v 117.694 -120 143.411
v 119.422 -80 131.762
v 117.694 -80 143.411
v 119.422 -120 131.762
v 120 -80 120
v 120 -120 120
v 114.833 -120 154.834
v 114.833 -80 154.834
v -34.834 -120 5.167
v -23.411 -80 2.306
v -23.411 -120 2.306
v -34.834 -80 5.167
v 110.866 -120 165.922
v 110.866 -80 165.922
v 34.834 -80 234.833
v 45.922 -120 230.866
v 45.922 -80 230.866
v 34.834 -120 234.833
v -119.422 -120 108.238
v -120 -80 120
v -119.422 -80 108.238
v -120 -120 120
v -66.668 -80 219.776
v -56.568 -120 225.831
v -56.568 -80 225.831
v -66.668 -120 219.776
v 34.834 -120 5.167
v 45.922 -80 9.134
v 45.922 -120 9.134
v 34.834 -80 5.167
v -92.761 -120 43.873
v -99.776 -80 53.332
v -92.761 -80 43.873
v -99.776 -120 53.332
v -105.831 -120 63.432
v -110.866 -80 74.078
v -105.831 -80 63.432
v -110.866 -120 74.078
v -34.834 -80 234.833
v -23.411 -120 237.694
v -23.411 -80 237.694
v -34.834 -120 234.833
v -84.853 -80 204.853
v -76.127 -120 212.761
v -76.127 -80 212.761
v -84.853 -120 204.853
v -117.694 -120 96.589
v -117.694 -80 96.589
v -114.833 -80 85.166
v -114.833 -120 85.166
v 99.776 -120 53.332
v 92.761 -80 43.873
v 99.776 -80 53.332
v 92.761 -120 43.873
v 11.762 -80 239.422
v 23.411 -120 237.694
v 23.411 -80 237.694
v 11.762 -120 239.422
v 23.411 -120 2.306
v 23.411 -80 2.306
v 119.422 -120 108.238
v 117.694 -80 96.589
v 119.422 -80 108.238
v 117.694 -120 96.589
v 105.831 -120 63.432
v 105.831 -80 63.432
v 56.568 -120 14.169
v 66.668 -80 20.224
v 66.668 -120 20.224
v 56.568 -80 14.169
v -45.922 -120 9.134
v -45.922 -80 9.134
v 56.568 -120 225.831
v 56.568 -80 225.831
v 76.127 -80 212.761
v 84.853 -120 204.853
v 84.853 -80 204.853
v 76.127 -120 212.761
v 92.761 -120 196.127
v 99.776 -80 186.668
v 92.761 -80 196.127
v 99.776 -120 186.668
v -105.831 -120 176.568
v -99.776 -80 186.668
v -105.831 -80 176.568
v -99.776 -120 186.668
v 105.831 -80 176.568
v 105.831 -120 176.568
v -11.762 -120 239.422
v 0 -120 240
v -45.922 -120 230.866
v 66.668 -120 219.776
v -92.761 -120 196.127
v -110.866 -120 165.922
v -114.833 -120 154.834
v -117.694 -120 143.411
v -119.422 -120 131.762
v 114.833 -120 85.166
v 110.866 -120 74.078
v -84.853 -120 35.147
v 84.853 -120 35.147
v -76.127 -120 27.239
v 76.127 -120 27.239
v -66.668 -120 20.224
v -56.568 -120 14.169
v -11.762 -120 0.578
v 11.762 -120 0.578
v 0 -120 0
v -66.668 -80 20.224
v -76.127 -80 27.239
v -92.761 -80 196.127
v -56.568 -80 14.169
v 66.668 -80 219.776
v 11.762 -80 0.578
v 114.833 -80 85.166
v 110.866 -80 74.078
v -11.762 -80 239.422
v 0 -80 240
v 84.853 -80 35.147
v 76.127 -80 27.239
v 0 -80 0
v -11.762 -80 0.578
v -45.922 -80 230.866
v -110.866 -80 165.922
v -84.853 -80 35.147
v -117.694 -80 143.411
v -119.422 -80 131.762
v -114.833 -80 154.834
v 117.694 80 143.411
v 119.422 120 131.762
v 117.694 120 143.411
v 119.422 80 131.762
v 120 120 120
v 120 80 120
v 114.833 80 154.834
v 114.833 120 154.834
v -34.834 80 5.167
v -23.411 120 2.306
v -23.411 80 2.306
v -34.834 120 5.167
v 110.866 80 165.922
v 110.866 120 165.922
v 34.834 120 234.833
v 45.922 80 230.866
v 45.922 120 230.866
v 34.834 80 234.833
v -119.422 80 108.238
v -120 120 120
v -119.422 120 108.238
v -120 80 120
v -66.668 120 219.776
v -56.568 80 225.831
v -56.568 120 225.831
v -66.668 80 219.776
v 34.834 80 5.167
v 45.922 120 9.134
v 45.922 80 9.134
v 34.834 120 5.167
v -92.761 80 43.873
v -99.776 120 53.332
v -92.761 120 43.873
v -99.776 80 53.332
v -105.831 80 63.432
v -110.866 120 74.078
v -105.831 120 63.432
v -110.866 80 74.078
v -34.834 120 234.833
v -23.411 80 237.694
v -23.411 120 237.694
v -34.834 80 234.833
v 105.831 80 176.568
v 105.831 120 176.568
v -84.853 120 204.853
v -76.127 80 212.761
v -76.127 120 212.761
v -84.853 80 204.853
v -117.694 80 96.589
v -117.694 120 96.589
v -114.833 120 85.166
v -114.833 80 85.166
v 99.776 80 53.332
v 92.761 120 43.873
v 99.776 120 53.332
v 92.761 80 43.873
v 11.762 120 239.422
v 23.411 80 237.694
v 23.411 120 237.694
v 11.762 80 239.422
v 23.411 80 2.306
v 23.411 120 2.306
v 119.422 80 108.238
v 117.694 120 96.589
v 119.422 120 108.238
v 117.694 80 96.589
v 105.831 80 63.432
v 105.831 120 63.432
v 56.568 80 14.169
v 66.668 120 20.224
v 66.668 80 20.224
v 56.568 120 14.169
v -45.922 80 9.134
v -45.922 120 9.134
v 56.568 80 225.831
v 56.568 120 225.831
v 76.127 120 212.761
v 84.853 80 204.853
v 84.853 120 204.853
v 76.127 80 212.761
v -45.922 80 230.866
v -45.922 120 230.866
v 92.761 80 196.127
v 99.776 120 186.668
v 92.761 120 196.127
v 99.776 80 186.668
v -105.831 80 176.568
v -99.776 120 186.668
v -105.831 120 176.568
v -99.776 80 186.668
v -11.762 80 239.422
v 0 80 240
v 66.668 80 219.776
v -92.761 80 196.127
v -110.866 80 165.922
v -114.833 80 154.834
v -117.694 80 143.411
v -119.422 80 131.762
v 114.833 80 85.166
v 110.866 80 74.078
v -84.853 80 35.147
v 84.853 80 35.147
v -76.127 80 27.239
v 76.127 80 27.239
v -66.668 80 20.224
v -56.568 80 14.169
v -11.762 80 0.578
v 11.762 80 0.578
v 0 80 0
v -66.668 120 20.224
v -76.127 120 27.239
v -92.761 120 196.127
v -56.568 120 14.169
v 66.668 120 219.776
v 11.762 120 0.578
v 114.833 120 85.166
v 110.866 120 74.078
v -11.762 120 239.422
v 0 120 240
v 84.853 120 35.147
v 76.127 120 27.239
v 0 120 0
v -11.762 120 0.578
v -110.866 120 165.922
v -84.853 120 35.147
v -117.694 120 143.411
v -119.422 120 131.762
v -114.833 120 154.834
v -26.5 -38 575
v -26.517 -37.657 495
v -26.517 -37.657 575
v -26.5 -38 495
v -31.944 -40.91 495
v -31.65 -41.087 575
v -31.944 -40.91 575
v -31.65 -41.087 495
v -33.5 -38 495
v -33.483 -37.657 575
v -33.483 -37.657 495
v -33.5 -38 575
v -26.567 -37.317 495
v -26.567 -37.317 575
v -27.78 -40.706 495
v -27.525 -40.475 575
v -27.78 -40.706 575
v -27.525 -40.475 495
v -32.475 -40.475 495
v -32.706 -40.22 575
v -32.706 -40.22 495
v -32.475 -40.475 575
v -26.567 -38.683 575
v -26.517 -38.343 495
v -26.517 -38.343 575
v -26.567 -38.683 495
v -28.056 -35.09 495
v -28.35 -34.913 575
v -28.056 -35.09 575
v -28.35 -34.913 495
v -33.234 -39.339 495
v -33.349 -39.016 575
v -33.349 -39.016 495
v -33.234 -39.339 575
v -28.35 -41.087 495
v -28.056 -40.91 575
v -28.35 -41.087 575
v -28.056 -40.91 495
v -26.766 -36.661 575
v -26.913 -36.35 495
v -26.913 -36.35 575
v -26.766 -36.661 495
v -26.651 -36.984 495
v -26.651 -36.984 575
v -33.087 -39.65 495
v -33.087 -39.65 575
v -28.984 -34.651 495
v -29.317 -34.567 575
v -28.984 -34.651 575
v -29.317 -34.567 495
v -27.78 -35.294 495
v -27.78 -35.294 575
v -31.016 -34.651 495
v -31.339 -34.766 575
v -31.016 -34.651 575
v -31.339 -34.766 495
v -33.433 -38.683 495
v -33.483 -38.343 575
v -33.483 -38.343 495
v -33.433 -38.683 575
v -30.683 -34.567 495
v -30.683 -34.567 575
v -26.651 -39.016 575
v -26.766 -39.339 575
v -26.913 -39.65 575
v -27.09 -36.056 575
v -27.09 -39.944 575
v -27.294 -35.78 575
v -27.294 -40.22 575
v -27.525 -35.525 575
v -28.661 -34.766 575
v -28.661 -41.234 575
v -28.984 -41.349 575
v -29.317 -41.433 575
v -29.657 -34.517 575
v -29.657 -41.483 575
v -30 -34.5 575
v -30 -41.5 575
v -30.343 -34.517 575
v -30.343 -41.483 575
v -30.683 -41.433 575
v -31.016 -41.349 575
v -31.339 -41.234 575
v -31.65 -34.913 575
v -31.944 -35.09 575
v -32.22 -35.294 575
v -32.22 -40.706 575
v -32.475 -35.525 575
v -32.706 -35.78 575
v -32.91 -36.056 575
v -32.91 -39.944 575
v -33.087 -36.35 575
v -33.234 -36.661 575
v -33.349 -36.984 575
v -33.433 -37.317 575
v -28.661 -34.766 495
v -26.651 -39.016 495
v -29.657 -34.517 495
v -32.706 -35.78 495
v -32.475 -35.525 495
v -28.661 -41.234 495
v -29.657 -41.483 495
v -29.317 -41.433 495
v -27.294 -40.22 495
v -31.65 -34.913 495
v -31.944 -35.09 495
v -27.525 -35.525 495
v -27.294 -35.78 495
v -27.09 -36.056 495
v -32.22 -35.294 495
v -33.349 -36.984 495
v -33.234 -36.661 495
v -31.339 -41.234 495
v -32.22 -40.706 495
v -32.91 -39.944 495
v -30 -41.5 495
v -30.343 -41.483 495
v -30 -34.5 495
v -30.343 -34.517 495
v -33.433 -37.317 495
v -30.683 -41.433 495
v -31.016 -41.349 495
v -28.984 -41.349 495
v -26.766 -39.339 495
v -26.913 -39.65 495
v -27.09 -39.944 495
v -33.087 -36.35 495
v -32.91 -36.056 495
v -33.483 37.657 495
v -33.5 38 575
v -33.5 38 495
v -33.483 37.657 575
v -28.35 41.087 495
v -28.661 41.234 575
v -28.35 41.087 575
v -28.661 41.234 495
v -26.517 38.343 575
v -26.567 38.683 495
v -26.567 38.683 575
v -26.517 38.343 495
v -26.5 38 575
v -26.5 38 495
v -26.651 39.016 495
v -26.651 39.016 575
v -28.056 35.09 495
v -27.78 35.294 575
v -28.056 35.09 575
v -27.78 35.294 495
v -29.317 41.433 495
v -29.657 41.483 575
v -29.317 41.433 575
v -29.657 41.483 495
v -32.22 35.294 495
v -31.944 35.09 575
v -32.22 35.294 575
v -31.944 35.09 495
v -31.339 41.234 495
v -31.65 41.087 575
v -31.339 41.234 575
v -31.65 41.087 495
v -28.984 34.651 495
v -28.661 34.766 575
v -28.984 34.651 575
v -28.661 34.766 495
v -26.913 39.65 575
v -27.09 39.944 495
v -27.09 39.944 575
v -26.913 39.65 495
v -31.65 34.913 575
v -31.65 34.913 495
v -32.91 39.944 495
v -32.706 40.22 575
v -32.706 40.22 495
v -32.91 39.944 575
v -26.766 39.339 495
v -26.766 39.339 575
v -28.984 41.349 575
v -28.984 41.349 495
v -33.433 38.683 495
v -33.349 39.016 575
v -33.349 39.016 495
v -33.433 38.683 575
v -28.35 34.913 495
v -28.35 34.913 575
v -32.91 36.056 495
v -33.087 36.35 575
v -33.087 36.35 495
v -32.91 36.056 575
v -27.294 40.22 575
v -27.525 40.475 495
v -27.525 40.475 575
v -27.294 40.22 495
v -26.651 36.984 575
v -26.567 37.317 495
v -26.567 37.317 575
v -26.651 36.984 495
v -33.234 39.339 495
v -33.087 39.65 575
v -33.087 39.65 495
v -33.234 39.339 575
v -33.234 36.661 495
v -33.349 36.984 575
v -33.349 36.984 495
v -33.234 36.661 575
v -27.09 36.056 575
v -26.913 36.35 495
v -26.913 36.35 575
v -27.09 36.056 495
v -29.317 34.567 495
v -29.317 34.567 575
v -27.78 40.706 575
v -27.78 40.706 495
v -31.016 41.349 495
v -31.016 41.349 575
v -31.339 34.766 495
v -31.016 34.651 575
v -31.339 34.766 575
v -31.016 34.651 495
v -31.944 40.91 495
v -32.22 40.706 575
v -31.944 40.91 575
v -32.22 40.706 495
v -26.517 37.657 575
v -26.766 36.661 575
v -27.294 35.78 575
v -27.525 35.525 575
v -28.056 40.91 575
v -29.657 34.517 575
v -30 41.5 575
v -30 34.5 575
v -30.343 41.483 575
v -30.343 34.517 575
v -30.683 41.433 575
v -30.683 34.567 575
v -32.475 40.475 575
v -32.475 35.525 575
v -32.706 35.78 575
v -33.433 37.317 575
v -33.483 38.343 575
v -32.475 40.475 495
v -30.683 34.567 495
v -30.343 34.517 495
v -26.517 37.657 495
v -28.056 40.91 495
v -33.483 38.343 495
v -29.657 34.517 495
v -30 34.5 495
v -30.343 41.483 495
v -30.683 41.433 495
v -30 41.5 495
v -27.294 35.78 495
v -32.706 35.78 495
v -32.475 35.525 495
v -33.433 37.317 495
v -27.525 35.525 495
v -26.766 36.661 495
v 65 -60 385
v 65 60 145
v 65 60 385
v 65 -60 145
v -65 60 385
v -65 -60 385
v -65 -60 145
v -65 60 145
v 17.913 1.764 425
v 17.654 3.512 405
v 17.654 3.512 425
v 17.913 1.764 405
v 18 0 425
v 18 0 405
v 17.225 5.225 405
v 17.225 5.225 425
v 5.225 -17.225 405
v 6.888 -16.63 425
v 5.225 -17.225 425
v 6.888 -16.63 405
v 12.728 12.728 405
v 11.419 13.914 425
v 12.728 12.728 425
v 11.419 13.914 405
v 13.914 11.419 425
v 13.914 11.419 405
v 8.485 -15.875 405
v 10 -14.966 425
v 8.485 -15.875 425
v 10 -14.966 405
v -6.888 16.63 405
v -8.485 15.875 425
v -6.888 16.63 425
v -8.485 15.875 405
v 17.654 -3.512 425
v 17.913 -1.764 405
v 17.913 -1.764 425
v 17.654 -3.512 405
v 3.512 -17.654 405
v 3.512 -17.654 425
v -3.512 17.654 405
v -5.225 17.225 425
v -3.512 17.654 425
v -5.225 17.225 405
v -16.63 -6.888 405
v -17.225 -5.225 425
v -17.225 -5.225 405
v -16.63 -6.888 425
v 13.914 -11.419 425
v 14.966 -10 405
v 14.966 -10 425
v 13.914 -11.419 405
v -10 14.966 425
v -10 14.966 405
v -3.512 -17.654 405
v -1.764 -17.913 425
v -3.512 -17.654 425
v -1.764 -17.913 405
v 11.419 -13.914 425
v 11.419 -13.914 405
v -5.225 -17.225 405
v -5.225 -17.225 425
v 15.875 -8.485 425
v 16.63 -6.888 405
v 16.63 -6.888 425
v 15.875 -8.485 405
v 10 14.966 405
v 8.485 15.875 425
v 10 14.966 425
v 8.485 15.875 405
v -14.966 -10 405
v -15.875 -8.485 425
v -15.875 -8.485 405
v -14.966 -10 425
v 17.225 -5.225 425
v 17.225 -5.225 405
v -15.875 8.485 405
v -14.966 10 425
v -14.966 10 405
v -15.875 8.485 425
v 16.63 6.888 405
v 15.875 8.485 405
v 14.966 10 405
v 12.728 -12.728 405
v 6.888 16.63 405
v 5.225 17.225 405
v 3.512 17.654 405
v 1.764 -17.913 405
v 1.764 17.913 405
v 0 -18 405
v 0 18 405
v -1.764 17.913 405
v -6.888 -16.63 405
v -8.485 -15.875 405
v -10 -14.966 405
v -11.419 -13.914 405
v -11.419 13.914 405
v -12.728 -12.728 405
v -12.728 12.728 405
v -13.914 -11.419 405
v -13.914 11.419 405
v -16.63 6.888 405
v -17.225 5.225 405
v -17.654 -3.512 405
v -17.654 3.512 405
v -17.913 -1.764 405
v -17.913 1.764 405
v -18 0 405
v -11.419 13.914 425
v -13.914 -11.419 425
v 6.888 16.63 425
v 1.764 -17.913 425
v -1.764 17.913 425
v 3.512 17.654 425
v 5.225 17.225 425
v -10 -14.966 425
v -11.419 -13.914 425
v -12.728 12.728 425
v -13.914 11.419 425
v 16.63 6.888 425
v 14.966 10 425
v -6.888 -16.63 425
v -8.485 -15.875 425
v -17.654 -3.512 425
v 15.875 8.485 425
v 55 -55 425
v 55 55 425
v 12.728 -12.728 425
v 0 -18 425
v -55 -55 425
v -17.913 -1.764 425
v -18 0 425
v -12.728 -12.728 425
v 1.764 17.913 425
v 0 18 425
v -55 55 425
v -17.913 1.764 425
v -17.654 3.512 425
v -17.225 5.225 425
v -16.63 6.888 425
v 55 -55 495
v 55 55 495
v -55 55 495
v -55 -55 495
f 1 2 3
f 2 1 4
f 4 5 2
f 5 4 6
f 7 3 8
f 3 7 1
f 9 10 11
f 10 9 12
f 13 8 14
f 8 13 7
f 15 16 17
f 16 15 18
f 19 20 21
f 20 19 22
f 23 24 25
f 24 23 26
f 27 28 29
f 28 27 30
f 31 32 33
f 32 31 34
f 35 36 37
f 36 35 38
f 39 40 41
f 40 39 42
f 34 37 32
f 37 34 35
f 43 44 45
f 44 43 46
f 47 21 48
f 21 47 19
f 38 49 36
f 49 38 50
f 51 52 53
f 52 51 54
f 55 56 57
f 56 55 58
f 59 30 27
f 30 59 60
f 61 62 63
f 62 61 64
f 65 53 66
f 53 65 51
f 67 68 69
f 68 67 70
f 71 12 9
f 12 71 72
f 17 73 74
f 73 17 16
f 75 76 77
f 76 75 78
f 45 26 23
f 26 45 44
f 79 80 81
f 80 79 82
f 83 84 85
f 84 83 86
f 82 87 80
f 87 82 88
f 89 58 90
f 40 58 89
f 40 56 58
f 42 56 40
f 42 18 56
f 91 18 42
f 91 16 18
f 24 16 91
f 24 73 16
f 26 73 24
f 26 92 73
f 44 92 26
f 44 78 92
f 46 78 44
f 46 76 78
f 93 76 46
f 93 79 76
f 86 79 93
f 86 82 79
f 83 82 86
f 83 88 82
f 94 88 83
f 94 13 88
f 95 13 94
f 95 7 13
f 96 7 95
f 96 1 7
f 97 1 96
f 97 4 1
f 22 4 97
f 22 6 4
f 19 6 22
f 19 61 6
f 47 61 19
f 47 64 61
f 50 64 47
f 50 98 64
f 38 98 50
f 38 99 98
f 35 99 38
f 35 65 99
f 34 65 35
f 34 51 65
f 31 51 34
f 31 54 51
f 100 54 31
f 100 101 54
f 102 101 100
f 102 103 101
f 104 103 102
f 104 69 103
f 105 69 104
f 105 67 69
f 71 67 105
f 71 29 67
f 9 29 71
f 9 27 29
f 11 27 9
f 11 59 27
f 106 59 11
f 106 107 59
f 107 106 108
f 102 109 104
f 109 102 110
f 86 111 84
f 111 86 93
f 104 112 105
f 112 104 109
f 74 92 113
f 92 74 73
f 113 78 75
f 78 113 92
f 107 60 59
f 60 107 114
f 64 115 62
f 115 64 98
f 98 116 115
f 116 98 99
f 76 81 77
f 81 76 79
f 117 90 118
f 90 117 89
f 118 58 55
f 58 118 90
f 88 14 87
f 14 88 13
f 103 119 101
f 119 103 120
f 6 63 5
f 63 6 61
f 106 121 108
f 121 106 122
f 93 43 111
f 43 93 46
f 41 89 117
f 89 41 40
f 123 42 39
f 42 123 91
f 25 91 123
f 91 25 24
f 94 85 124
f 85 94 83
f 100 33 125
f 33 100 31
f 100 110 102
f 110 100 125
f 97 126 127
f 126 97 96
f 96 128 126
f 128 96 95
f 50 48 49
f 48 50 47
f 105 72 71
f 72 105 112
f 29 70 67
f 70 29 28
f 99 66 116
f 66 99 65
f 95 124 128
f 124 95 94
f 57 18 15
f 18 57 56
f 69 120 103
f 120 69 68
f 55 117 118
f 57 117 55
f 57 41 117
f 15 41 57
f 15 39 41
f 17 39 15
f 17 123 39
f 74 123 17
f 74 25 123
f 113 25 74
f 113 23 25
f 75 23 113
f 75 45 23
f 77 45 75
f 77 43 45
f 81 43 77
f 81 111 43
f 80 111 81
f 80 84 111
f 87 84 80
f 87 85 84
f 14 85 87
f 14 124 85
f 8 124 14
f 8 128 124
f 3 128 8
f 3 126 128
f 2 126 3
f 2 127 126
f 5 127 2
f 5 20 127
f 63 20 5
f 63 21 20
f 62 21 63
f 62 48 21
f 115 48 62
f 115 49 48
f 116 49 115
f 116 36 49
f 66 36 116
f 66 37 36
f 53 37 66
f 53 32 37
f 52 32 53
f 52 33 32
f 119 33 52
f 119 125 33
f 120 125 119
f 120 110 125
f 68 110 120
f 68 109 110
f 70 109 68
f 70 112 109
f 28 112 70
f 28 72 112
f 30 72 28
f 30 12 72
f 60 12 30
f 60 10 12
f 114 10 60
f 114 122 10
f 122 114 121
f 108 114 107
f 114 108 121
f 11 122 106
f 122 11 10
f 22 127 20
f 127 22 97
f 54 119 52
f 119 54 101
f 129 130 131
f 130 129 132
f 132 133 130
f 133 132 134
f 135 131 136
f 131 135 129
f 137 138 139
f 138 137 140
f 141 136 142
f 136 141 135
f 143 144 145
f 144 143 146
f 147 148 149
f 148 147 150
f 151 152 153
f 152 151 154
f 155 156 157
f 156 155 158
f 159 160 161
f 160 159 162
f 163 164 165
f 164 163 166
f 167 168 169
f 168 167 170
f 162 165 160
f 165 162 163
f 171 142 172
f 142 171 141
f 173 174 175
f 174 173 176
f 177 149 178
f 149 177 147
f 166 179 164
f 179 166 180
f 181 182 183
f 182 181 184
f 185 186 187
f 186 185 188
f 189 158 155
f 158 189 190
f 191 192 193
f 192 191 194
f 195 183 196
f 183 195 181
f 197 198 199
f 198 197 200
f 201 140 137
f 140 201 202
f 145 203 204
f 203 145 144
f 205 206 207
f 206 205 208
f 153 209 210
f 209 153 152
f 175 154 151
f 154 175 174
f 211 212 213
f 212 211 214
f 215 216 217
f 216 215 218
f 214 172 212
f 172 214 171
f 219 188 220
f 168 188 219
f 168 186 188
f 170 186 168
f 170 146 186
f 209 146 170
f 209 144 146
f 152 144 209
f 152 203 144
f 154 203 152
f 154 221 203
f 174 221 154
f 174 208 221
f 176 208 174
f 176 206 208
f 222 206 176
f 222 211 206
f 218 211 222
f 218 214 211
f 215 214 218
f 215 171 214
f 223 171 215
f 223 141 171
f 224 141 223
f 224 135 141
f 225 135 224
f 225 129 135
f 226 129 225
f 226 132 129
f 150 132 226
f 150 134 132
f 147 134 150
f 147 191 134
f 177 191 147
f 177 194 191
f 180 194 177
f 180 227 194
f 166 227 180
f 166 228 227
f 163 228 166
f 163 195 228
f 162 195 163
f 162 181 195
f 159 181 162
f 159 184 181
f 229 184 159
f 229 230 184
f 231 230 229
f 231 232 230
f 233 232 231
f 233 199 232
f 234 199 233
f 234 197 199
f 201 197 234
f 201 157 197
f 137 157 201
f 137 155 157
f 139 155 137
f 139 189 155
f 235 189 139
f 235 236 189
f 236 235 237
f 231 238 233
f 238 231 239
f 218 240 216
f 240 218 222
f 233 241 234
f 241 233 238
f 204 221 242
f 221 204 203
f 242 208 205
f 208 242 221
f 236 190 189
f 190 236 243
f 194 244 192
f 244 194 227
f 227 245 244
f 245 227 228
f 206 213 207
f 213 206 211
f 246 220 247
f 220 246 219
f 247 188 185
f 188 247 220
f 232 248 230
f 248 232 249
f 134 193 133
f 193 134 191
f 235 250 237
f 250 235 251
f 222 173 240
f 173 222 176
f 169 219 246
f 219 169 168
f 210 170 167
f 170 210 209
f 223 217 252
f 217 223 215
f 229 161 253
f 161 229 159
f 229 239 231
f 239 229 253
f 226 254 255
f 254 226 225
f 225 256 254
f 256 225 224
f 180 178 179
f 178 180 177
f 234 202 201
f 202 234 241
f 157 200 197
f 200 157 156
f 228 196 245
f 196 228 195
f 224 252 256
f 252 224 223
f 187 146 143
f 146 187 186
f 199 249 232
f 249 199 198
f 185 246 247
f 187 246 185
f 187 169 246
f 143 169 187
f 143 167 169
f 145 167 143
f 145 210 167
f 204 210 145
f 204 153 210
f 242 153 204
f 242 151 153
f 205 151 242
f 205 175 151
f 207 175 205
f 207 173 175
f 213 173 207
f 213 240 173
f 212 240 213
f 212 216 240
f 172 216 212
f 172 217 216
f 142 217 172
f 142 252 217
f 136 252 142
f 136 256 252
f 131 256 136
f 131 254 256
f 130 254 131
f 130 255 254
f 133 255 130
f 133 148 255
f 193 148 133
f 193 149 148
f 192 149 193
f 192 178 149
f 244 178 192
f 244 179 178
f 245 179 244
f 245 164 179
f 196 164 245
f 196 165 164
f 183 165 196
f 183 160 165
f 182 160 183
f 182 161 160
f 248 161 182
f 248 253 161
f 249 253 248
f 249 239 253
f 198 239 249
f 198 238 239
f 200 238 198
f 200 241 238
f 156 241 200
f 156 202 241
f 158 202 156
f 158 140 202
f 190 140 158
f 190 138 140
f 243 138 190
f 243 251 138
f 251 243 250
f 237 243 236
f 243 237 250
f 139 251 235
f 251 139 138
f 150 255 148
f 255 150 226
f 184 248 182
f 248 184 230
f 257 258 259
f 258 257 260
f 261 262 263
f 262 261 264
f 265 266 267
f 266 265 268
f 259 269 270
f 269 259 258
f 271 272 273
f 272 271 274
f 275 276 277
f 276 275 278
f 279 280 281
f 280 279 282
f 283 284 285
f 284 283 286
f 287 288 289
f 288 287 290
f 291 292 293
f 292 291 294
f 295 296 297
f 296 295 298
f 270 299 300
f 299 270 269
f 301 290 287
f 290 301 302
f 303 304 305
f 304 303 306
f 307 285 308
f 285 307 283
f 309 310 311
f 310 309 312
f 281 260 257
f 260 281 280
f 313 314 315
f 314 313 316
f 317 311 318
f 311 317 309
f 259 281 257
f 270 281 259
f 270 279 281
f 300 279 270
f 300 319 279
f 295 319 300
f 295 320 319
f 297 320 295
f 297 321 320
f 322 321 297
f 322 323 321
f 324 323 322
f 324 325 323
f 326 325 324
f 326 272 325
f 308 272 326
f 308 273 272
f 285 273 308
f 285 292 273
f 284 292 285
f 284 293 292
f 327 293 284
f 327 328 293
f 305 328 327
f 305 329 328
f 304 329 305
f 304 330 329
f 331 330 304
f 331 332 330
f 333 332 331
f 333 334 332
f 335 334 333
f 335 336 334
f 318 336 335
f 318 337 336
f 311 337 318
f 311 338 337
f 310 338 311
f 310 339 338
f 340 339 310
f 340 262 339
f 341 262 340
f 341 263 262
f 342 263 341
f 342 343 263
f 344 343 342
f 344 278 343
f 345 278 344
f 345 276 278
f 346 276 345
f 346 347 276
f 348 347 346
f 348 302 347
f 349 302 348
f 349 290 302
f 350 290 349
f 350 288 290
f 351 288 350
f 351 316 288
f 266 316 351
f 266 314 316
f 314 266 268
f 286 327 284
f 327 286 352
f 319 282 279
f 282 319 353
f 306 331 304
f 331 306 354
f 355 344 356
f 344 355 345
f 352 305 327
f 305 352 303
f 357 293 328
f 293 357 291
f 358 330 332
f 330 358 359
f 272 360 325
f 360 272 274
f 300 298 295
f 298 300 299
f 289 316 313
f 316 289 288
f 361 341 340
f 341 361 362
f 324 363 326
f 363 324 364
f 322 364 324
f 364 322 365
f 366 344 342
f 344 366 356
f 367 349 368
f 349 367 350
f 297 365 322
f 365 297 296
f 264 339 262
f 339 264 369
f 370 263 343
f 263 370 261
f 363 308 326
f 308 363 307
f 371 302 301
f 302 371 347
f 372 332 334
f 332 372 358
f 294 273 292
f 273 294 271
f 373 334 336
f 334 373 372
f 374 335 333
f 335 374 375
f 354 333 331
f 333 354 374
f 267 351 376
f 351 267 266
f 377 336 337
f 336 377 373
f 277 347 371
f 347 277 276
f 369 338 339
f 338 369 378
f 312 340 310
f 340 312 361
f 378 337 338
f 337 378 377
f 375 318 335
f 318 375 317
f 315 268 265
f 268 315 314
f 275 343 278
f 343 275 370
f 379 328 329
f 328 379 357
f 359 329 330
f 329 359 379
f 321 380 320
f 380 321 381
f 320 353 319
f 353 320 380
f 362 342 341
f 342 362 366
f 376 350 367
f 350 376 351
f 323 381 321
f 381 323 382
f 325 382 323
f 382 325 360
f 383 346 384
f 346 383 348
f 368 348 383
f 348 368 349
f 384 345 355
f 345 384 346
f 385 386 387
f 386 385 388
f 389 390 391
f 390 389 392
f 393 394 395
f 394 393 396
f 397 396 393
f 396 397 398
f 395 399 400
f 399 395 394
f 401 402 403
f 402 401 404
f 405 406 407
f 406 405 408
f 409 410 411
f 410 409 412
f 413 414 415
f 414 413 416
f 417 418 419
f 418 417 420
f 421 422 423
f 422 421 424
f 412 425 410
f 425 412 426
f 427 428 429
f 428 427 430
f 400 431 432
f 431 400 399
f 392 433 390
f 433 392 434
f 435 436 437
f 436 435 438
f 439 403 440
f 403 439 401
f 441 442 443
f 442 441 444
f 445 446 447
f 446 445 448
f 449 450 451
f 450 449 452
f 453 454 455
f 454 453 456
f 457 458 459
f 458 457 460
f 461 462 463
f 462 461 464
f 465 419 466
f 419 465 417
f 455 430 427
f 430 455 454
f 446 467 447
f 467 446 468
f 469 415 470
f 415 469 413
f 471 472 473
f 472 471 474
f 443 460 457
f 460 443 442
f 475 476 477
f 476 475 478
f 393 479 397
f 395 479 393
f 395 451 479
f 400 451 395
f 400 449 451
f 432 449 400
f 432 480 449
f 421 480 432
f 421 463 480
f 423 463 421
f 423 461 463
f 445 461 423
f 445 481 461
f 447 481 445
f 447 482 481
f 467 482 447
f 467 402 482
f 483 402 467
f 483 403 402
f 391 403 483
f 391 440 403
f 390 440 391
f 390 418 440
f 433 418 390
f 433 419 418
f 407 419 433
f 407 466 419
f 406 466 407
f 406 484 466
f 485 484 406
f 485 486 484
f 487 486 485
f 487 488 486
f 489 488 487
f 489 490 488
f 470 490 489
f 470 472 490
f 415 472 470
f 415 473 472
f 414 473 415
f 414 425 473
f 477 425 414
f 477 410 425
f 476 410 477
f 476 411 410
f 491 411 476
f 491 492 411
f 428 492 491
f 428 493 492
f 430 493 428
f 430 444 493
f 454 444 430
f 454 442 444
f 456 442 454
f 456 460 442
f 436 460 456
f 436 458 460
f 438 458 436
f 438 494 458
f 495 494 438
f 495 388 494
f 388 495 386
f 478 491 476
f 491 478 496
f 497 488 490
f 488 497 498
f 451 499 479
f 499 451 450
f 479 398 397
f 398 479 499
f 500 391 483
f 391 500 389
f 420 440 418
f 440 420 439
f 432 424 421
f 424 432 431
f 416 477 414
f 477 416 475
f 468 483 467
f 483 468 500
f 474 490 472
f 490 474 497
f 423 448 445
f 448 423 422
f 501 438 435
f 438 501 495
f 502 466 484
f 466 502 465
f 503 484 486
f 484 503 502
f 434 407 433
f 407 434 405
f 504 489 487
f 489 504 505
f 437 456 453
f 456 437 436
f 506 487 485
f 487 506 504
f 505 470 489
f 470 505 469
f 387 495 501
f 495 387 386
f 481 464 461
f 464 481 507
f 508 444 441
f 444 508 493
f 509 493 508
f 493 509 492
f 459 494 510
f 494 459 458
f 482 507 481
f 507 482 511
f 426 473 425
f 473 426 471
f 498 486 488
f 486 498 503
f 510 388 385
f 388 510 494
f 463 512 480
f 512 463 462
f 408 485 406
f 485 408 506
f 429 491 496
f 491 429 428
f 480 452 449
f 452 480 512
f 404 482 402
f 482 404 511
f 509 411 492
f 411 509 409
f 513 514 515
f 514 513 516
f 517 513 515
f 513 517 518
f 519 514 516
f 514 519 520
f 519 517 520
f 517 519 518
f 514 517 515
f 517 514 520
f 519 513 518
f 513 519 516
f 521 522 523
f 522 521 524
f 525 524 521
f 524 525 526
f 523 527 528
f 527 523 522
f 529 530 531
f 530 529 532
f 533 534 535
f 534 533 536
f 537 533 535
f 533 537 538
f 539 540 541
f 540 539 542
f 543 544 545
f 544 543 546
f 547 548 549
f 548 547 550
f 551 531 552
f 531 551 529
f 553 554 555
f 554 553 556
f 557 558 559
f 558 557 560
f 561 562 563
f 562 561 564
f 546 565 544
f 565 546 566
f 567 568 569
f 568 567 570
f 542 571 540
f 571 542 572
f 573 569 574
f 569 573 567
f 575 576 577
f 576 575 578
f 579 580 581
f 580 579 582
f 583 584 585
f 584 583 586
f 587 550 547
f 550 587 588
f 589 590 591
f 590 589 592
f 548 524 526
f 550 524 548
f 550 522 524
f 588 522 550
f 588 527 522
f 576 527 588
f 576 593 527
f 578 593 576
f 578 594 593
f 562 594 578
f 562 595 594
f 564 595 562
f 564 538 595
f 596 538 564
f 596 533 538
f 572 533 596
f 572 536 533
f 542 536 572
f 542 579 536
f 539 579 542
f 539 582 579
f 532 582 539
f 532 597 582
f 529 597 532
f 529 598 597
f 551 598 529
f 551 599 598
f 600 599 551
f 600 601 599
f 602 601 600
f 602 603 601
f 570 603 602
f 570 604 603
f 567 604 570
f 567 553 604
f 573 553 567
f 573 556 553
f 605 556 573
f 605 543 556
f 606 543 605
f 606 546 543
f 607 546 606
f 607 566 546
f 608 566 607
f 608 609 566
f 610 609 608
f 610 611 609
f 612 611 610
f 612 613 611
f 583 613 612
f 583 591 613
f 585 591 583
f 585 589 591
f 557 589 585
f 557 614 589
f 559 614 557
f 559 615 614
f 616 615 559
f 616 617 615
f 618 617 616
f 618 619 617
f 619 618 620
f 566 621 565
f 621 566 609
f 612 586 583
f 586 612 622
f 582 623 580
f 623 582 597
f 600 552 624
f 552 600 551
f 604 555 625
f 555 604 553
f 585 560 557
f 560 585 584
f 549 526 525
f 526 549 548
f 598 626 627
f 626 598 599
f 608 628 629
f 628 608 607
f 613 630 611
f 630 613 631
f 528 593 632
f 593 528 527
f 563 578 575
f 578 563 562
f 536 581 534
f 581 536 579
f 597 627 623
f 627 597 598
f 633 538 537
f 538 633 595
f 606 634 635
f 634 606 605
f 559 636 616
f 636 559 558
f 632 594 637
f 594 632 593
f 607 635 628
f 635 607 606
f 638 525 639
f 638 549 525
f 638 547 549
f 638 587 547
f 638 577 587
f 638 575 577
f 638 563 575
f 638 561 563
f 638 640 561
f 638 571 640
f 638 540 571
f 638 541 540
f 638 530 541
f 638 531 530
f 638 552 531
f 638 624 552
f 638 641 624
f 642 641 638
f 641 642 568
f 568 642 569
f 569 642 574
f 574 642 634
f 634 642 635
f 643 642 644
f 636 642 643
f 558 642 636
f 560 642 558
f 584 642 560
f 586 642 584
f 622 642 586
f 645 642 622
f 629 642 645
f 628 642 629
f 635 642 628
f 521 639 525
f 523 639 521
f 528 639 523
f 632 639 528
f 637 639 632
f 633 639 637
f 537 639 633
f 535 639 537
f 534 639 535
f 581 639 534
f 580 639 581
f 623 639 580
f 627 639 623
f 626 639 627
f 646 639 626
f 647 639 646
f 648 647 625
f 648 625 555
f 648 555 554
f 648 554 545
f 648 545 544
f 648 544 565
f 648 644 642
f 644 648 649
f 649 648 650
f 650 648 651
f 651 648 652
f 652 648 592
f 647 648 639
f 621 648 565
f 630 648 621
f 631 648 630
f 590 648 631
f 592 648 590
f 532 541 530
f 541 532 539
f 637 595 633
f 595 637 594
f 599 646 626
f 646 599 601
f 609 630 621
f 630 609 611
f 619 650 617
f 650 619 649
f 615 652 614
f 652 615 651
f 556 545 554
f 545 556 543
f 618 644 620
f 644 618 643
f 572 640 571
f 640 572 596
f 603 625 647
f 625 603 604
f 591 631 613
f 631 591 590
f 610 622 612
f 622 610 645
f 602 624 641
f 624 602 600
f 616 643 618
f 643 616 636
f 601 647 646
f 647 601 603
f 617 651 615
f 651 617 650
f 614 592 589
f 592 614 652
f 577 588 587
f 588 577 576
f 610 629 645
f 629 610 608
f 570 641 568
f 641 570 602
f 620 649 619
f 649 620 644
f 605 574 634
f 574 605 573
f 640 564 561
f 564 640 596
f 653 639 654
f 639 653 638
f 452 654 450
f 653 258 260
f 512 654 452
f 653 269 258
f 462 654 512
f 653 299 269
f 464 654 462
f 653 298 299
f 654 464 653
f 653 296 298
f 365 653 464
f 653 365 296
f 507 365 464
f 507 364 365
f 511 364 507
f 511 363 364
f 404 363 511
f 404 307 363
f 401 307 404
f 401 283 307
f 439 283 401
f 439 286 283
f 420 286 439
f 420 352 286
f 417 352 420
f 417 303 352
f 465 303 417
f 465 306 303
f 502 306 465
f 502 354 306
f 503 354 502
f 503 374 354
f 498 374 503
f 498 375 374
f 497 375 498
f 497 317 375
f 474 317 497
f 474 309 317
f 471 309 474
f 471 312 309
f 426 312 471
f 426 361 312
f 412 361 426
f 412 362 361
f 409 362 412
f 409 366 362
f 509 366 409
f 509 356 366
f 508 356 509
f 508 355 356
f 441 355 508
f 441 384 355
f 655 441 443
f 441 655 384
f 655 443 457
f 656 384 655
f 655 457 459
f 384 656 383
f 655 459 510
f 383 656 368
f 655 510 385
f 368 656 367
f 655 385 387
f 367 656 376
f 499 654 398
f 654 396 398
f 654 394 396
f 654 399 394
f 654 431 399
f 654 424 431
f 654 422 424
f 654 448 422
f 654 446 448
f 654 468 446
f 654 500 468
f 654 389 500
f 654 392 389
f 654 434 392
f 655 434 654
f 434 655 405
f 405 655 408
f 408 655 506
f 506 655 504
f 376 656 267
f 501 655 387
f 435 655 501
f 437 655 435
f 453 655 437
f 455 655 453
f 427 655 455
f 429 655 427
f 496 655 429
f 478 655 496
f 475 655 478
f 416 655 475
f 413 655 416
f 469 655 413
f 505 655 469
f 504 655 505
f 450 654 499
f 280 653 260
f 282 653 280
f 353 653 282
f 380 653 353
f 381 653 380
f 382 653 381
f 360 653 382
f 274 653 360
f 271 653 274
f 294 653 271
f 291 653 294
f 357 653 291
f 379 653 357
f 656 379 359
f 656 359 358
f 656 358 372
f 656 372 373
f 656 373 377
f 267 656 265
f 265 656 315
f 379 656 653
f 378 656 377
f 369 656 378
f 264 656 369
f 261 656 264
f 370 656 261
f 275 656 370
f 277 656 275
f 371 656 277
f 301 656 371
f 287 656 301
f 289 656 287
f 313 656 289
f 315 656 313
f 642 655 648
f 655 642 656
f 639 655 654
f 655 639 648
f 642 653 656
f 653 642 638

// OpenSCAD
/* PHOI CANH THAM KHAO: KHONG PHAI MO HINH DE IN.
 * 240 mm duong kinh banh, khoang cach tam banh 200 mm, banh rong 40 mm.
 * Than khong bao gom motor, pin, gioang truc, duong dien hay cham soc co khi.
 */
$fn=64;
wheel_r=120; wheel_w=40; axle_spacing=200; body_w=120; body_d=130;
// Tam banh x=0, y=+-100, z=120. Truc banh theo Y, dau quay quanh Z.
color([.10,.10,.11])for(y=[-axle_spacing/2,axle_spacing/2])
 translate([0,y,wheel_r]) rotate([90,0,0]) cylinder(h=wheel_w,r=wheel_r,center=true);
color([.30,.33,.36,.8]) translate([-body_d/2,-body_w/2,145])cube([body_d,body_w,240]);
color([.22,.45,.7])translate([-35,-50,195])cube([70,100,110]); // placeholder
color([.15,.15,.16])translate([0,0,405])cylinder(h=20,d=36);
color([.2,.22,.25])translate([-55,-55,425])cube([110,110,70]); // dau tham khao
color([.1,.1,.1])for(y=[-38,38])translate([-30,y,490])cylinder(h=85,d=7);
